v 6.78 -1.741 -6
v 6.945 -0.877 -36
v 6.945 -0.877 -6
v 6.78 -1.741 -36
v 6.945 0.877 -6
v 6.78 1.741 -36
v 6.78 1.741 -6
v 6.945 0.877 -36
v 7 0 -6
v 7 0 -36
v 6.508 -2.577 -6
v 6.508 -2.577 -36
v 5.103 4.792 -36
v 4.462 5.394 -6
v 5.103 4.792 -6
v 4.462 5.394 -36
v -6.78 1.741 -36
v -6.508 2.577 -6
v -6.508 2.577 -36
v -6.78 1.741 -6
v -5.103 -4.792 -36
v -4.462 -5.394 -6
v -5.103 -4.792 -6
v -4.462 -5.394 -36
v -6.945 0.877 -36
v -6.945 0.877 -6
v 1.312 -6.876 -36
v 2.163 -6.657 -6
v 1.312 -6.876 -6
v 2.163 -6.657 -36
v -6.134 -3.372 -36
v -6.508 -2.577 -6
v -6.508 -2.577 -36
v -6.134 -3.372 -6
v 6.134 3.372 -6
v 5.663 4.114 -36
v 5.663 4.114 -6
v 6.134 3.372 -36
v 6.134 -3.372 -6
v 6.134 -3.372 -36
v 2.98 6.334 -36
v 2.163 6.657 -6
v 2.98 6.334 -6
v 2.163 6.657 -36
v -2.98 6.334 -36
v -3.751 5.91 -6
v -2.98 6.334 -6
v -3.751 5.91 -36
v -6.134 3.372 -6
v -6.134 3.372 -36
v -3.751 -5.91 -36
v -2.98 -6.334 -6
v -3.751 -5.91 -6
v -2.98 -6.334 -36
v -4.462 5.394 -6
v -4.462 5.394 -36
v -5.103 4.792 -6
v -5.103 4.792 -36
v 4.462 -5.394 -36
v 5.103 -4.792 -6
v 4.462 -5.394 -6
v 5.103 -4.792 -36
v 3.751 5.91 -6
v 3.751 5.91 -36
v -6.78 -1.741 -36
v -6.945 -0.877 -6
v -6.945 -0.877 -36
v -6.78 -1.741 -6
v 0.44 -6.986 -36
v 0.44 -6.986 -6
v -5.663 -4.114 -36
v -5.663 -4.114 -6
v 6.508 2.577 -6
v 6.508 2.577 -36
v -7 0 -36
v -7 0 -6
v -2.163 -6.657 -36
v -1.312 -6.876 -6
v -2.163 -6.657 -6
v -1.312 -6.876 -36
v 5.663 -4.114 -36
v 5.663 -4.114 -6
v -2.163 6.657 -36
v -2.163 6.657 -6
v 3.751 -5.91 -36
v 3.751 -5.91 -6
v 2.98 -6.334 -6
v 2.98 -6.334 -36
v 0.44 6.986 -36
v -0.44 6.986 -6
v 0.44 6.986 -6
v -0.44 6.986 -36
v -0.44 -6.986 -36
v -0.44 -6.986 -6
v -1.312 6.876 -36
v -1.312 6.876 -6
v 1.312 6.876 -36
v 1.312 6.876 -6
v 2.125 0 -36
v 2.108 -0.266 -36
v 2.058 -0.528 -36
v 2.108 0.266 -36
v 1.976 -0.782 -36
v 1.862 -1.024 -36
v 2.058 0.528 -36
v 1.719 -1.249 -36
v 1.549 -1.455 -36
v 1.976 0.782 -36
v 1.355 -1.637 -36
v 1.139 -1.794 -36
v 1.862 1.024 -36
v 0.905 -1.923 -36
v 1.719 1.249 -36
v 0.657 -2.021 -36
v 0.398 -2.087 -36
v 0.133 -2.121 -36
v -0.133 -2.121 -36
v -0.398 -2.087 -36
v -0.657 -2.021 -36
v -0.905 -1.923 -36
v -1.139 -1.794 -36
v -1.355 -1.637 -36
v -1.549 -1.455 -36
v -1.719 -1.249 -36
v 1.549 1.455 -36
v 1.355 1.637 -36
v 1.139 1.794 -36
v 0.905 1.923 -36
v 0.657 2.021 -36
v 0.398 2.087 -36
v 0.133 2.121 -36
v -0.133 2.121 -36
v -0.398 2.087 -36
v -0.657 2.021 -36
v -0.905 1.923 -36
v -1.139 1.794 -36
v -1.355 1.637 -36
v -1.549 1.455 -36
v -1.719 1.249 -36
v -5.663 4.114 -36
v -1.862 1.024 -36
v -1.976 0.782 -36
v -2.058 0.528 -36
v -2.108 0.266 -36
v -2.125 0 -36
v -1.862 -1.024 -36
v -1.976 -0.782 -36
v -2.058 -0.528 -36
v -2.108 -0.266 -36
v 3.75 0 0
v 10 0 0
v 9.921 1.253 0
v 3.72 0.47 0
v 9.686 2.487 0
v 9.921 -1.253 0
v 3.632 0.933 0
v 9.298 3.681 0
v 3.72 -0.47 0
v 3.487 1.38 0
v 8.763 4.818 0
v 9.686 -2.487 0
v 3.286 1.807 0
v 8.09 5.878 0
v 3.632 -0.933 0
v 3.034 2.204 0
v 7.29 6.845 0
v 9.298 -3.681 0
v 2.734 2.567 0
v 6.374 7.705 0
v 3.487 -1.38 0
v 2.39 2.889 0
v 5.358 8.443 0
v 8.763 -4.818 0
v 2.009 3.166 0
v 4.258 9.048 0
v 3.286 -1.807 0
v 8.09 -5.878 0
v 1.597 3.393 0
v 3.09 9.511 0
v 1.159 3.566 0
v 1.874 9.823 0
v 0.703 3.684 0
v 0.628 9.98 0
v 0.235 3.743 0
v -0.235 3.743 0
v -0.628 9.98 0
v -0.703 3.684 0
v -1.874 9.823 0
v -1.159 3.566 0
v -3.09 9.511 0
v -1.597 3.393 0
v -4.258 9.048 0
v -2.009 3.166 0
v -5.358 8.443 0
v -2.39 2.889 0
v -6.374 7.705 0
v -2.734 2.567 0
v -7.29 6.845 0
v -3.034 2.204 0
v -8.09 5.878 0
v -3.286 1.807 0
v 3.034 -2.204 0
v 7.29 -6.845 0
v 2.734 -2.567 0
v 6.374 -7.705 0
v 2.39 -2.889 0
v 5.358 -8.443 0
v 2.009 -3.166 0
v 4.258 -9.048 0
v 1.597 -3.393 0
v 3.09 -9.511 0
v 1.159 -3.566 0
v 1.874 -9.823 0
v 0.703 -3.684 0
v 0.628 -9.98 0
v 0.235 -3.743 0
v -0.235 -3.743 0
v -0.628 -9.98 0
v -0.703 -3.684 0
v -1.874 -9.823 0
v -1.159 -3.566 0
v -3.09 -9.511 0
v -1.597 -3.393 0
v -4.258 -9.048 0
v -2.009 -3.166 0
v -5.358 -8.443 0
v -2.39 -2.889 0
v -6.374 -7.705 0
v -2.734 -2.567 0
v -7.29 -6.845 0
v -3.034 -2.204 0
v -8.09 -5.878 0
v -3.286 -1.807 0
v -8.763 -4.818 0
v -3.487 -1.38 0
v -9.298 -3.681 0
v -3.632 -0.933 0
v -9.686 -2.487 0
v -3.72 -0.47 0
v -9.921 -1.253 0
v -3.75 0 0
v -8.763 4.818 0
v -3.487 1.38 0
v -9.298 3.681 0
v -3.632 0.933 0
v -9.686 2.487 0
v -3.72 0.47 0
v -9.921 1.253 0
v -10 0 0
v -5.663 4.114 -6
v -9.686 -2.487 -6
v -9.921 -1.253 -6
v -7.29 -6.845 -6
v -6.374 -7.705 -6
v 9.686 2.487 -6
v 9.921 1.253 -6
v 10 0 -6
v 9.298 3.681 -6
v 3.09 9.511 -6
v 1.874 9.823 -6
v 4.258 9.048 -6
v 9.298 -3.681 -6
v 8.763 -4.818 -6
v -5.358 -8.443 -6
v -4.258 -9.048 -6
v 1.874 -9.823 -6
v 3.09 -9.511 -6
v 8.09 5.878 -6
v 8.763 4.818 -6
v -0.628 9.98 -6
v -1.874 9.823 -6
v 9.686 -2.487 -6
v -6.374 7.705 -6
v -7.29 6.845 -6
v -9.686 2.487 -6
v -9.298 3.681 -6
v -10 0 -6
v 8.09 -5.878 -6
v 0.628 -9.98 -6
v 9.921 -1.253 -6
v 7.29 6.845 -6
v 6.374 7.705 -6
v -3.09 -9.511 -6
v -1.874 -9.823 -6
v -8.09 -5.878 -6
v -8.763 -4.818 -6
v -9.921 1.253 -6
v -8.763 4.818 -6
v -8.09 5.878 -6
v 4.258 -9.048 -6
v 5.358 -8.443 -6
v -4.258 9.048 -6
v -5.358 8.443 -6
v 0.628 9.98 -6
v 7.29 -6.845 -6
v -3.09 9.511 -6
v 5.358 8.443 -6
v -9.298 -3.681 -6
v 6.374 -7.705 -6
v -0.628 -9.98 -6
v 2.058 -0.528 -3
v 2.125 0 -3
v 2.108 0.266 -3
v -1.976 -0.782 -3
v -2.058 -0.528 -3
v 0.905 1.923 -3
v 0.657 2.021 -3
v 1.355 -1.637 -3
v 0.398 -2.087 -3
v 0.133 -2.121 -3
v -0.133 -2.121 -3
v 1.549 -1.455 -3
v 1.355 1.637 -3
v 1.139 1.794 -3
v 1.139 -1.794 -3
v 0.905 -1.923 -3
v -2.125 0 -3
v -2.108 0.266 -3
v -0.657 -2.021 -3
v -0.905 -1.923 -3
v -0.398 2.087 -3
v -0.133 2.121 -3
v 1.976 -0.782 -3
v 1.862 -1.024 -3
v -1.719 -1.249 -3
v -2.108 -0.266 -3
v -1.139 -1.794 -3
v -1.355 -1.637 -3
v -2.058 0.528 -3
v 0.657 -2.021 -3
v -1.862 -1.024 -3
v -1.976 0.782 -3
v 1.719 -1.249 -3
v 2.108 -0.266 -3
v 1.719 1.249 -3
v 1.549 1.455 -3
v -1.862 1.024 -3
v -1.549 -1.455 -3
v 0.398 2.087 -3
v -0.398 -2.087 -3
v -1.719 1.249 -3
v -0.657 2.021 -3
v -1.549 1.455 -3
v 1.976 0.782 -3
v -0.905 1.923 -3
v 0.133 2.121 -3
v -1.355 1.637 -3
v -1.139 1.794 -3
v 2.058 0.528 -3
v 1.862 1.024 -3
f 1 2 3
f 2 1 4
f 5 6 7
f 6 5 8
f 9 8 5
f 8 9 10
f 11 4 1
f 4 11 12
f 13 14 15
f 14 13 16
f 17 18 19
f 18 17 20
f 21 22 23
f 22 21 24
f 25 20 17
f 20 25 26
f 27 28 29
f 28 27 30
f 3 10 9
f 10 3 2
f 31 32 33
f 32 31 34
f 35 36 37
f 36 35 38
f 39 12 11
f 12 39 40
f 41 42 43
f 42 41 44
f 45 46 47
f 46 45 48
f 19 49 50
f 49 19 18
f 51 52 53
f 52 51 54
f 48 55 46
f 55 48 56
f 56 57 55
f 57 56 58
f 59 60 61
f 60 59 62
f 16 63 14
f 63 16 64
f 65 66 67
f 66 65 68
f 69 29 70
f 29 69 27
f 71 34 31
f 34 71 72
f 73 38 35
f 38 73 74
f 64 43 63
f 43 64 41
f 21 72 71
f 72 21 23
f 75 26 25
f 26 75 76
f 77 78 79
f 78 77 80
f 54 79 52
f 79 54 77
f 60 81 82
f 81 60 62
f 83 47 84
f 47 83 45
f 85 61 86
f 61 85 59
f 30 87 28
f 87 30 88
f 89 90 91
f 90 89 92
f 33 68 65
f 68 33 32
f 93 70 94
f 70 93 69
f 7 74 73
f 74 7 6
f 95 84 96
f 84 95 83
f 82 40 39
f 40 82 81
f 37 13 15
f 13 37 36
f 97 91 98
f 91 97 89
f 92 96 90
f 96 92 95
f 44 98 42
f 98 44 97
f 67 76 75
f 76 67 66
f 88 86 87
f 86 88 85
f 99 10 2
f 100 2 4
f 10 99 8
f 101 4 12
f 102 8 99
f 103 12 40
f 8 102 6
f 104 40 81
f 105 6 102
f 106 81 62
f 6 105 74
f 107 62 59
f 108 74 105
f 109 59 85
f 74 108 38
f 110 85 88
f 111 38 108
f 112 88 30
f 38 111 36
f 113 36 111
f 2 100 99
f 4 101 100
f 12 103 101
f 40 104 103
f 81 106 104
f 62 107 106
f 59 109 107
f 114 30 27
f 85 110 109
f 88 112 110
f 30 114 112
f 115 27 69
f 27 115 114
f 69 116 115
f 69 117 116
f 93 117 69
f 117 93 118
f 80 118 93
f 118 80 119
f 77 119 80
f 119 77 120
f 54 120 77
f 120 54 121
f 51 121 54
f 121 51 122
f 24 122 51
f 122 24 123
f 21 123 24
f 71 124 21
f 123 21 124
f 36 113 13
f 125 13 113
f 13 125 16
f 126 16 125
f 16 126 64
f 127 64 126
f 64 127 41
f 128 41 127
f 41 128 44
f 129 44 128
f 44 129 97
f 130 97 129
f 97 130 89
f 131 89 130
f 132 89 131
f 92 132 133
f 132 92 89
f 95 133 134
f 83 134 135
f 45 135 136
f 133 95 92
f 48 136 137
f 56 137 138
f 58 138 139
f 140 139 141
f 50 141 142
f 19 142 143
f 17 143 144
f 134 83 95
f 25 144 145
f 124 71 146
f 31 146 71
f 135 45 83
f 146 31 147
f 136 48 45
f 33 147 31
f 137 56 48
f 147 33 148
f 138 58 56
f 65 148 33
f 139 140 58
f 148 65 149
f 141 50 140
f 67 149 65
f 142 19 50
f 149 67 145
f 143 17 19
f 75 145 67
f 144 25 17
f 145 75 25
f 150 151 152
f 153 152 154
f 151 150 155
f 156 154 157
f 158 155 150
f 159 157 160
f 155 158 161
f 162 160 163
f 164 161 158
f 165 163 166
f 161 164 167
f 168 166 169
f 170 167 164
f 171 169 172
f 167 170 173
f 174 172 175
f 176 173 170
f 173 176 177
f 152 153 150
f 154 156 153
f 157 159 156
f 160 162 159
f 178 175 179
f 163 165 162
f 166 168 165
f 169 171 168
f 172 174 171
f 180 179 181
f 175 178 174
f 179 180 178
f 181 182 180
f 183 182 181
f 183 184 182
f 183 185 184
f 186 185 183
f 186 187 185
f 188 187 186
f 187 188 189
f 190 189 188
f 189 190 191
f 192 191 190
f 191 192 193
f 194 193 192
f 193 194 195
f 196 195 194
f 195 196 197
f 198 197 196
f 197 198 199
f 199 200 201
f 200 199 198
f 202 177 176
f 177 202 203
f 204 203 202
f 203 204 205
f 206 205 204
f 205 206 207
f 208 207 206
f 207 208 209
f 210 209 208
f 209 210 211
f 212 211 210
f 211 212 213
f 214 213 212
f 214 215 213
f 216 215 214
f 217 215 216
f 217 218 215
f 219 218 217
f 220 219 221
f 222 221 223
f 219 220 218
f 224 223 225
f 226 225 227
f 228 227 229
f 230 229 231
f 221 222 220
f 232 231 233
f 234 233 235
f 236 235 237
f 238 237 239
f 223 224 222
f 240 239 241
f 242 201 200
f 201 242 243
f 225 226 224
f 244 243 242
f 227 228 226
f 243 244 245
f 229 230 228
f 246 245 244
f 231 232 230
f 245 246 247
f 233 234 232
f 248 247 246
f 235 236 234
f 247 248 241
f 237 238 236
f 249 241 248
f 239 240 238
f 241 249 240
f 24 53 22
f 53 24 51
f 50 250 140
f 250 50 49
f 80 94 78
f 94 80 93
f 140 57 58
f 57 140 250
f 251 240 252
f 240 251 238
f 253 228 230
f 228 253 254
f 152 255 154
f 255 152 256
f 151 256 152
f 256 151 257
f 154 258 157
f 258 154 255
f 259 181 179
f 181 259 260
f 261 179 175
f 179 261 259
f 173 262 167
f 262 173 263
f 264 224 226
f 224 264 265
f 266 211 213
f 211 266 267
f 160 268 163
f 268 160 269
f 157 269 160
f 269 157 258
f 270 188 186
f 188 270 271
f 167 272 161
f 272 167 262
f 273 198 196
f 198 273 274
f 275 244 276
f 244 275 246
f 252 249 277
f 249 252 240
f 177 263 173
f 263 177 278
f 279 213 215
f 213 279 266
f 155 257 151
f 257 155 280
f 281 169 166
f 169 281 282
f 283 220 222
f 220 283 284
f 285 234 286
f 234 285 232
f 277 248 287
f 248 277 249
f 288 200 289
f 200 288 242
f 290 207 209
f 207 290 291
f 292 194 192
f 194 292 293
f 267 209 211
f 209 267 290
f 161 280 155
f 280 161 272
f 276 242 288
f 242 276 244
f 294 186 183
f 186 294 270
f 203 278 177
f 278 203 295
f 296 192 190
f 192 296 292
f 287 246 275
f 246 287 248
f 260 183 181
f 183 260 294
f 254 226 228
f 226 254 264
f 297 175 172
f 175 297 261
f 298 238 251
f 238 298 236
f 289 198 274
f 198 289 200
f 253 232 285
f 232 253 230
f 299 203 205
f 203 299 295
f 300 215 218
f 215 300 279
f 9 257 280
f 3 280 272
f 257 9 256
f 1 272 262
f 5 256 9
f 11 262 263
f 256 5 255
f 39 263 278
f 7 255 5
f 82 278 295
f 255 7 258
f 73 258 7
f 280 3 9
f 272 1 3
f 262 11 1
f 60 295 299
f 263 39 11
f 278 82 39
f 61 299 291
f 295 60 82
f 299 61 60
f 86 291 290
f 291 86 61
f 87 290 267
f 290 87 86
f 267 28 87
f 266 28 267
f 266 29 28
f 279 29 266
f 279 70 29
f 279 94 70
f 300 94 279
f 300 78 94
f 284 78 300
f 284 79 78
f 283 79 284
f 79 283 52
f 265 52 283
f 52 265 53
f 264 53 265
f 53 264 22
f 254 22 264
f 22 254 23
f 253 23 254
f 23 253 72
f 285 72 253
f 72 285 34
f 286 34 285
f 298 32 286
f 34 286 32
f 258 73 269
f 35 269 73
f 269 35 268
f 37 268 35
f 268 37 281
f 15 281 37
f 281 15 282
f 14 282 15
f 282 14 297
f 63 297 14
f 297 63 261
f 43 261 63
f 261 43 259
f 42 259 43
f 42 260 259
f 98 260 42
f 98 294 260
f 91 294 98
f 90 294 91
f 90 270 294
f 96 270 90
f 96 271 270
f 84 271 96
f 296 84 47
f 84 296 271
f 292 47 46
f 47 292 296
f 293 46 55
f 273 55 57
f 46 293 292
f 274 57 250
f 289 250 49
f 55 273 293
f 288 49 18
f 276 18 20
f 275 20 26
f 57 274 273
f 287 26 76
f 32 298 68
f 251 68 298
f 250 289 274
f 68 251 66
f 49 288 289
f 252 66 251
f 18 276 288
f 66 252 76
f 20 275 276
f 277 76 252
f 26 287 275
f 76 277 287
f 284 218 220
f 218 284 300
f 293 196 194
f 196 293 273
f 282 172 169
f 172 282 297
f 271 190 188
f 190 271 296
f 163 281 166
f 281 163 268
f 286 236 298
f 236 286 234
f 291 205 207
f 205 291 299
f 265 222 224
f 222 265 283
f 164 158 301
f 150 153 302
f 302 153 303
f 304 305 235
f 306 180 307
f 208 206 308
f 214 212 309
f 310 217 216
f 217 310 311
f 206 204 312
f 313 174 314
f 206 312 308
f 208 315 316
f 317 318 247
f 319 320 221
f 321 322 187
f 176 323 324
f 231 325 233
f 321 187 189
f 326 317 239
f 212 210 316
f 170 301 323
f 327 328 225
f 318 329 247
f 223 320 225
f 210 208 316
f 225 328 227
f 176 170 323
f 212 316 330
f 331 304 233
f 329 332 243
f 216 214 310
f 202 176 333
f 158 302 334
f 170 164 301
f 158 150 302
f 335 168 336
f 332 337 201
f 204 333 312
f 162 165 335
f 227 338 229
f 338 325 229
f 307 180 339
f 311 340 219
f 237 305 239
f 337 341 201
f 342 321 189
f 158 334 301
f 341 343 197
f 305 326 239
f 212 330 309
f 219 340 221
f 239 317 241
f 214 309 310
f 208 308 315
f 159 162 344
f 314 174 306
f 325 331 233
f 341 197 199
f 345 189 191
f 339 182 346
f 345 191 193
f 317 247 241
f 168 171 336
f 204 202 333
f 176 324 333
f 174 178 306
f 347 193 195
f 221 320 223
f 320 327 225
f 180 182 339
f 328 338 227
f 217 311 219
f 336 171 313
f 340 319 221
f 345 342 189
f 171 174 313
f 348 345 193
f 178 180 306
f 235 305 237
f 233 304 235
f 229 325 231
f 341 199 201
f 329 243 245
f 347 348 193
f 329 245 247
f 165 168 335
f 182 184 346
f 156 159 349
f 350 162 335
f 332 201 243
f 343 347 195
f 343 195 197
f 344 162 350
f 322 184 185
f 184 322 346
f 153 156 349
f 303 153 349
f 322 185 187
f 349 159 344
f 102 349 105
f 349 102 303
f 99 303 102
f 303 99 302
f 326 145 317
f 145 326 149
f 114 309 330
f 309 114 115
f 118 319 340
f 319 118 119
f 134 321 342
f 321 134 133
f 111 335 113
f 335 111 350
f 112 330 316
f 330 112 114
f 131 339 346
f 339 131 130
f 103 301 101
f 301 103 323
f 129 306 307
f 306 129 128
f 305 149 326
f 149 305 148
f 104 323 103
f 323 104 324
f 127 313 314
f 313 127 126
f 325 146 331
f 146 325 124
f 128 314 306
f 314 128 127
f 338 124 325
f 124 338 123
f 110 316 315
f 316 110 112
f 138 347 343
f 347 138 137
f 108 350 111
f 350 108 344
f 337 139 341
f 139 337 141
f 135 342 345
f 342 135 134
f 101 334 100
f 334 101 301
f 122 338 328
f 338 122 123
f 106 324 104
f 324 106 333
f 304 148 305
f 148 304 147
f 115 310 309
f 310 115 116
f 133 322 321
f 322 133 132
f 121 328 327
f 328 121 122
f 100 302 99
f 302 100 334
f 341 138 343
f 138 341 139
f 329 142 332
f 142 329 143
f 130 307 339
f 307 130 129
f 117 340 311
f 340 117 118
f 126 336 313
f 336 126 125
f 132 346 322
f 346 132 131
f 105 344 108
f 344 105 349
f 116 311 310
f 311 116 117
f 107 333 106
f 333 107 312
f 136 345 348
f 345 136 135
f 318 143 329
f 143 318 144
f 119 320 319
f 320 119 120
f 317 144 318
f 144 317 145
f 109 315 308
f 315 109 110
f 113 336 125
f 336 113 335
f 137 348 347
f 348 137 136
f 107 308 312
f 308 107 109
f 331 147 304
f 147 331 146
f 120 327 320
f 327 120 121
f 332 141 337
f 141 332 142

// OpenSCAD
$fn = 50;


difference() {
	union() {
		translate(v = [0, 0, -36.0000000000]) {
			cylinder(h = 36, r = 7.0000000000);
		}
		translate(v = [0, 0, -6.0000000000]) {
			cylinder(h = 6, r = 10.0000000000);
		}
	}
	union() {
		translate(v = [0, 0, 0]) {
			rotate(a = [0, 0, 0]) {
				difference() {
					union() {
						#translate(v = [0, 0, -36.0000000000]) {
							cylinder(h = 36, r = 2.0000000000);
						}
						#translate(v = [0, 0, -3]) {
							cylinder(h = 3, r = 7.0000000000, r1 = 2.1250000000, r2 = 3.7500000000);
						}
						#translate(v = [0, 0, -36.0000000000]) {
							cylinder(h = 36, r = 2.1250000000);
						}
						#translate(v = [0, 0, -36.0000000000]) {
							cylinder(h = 36, r = 2.0000000000);
						}
					}
					union();
				}
			}
		}
	}
}
